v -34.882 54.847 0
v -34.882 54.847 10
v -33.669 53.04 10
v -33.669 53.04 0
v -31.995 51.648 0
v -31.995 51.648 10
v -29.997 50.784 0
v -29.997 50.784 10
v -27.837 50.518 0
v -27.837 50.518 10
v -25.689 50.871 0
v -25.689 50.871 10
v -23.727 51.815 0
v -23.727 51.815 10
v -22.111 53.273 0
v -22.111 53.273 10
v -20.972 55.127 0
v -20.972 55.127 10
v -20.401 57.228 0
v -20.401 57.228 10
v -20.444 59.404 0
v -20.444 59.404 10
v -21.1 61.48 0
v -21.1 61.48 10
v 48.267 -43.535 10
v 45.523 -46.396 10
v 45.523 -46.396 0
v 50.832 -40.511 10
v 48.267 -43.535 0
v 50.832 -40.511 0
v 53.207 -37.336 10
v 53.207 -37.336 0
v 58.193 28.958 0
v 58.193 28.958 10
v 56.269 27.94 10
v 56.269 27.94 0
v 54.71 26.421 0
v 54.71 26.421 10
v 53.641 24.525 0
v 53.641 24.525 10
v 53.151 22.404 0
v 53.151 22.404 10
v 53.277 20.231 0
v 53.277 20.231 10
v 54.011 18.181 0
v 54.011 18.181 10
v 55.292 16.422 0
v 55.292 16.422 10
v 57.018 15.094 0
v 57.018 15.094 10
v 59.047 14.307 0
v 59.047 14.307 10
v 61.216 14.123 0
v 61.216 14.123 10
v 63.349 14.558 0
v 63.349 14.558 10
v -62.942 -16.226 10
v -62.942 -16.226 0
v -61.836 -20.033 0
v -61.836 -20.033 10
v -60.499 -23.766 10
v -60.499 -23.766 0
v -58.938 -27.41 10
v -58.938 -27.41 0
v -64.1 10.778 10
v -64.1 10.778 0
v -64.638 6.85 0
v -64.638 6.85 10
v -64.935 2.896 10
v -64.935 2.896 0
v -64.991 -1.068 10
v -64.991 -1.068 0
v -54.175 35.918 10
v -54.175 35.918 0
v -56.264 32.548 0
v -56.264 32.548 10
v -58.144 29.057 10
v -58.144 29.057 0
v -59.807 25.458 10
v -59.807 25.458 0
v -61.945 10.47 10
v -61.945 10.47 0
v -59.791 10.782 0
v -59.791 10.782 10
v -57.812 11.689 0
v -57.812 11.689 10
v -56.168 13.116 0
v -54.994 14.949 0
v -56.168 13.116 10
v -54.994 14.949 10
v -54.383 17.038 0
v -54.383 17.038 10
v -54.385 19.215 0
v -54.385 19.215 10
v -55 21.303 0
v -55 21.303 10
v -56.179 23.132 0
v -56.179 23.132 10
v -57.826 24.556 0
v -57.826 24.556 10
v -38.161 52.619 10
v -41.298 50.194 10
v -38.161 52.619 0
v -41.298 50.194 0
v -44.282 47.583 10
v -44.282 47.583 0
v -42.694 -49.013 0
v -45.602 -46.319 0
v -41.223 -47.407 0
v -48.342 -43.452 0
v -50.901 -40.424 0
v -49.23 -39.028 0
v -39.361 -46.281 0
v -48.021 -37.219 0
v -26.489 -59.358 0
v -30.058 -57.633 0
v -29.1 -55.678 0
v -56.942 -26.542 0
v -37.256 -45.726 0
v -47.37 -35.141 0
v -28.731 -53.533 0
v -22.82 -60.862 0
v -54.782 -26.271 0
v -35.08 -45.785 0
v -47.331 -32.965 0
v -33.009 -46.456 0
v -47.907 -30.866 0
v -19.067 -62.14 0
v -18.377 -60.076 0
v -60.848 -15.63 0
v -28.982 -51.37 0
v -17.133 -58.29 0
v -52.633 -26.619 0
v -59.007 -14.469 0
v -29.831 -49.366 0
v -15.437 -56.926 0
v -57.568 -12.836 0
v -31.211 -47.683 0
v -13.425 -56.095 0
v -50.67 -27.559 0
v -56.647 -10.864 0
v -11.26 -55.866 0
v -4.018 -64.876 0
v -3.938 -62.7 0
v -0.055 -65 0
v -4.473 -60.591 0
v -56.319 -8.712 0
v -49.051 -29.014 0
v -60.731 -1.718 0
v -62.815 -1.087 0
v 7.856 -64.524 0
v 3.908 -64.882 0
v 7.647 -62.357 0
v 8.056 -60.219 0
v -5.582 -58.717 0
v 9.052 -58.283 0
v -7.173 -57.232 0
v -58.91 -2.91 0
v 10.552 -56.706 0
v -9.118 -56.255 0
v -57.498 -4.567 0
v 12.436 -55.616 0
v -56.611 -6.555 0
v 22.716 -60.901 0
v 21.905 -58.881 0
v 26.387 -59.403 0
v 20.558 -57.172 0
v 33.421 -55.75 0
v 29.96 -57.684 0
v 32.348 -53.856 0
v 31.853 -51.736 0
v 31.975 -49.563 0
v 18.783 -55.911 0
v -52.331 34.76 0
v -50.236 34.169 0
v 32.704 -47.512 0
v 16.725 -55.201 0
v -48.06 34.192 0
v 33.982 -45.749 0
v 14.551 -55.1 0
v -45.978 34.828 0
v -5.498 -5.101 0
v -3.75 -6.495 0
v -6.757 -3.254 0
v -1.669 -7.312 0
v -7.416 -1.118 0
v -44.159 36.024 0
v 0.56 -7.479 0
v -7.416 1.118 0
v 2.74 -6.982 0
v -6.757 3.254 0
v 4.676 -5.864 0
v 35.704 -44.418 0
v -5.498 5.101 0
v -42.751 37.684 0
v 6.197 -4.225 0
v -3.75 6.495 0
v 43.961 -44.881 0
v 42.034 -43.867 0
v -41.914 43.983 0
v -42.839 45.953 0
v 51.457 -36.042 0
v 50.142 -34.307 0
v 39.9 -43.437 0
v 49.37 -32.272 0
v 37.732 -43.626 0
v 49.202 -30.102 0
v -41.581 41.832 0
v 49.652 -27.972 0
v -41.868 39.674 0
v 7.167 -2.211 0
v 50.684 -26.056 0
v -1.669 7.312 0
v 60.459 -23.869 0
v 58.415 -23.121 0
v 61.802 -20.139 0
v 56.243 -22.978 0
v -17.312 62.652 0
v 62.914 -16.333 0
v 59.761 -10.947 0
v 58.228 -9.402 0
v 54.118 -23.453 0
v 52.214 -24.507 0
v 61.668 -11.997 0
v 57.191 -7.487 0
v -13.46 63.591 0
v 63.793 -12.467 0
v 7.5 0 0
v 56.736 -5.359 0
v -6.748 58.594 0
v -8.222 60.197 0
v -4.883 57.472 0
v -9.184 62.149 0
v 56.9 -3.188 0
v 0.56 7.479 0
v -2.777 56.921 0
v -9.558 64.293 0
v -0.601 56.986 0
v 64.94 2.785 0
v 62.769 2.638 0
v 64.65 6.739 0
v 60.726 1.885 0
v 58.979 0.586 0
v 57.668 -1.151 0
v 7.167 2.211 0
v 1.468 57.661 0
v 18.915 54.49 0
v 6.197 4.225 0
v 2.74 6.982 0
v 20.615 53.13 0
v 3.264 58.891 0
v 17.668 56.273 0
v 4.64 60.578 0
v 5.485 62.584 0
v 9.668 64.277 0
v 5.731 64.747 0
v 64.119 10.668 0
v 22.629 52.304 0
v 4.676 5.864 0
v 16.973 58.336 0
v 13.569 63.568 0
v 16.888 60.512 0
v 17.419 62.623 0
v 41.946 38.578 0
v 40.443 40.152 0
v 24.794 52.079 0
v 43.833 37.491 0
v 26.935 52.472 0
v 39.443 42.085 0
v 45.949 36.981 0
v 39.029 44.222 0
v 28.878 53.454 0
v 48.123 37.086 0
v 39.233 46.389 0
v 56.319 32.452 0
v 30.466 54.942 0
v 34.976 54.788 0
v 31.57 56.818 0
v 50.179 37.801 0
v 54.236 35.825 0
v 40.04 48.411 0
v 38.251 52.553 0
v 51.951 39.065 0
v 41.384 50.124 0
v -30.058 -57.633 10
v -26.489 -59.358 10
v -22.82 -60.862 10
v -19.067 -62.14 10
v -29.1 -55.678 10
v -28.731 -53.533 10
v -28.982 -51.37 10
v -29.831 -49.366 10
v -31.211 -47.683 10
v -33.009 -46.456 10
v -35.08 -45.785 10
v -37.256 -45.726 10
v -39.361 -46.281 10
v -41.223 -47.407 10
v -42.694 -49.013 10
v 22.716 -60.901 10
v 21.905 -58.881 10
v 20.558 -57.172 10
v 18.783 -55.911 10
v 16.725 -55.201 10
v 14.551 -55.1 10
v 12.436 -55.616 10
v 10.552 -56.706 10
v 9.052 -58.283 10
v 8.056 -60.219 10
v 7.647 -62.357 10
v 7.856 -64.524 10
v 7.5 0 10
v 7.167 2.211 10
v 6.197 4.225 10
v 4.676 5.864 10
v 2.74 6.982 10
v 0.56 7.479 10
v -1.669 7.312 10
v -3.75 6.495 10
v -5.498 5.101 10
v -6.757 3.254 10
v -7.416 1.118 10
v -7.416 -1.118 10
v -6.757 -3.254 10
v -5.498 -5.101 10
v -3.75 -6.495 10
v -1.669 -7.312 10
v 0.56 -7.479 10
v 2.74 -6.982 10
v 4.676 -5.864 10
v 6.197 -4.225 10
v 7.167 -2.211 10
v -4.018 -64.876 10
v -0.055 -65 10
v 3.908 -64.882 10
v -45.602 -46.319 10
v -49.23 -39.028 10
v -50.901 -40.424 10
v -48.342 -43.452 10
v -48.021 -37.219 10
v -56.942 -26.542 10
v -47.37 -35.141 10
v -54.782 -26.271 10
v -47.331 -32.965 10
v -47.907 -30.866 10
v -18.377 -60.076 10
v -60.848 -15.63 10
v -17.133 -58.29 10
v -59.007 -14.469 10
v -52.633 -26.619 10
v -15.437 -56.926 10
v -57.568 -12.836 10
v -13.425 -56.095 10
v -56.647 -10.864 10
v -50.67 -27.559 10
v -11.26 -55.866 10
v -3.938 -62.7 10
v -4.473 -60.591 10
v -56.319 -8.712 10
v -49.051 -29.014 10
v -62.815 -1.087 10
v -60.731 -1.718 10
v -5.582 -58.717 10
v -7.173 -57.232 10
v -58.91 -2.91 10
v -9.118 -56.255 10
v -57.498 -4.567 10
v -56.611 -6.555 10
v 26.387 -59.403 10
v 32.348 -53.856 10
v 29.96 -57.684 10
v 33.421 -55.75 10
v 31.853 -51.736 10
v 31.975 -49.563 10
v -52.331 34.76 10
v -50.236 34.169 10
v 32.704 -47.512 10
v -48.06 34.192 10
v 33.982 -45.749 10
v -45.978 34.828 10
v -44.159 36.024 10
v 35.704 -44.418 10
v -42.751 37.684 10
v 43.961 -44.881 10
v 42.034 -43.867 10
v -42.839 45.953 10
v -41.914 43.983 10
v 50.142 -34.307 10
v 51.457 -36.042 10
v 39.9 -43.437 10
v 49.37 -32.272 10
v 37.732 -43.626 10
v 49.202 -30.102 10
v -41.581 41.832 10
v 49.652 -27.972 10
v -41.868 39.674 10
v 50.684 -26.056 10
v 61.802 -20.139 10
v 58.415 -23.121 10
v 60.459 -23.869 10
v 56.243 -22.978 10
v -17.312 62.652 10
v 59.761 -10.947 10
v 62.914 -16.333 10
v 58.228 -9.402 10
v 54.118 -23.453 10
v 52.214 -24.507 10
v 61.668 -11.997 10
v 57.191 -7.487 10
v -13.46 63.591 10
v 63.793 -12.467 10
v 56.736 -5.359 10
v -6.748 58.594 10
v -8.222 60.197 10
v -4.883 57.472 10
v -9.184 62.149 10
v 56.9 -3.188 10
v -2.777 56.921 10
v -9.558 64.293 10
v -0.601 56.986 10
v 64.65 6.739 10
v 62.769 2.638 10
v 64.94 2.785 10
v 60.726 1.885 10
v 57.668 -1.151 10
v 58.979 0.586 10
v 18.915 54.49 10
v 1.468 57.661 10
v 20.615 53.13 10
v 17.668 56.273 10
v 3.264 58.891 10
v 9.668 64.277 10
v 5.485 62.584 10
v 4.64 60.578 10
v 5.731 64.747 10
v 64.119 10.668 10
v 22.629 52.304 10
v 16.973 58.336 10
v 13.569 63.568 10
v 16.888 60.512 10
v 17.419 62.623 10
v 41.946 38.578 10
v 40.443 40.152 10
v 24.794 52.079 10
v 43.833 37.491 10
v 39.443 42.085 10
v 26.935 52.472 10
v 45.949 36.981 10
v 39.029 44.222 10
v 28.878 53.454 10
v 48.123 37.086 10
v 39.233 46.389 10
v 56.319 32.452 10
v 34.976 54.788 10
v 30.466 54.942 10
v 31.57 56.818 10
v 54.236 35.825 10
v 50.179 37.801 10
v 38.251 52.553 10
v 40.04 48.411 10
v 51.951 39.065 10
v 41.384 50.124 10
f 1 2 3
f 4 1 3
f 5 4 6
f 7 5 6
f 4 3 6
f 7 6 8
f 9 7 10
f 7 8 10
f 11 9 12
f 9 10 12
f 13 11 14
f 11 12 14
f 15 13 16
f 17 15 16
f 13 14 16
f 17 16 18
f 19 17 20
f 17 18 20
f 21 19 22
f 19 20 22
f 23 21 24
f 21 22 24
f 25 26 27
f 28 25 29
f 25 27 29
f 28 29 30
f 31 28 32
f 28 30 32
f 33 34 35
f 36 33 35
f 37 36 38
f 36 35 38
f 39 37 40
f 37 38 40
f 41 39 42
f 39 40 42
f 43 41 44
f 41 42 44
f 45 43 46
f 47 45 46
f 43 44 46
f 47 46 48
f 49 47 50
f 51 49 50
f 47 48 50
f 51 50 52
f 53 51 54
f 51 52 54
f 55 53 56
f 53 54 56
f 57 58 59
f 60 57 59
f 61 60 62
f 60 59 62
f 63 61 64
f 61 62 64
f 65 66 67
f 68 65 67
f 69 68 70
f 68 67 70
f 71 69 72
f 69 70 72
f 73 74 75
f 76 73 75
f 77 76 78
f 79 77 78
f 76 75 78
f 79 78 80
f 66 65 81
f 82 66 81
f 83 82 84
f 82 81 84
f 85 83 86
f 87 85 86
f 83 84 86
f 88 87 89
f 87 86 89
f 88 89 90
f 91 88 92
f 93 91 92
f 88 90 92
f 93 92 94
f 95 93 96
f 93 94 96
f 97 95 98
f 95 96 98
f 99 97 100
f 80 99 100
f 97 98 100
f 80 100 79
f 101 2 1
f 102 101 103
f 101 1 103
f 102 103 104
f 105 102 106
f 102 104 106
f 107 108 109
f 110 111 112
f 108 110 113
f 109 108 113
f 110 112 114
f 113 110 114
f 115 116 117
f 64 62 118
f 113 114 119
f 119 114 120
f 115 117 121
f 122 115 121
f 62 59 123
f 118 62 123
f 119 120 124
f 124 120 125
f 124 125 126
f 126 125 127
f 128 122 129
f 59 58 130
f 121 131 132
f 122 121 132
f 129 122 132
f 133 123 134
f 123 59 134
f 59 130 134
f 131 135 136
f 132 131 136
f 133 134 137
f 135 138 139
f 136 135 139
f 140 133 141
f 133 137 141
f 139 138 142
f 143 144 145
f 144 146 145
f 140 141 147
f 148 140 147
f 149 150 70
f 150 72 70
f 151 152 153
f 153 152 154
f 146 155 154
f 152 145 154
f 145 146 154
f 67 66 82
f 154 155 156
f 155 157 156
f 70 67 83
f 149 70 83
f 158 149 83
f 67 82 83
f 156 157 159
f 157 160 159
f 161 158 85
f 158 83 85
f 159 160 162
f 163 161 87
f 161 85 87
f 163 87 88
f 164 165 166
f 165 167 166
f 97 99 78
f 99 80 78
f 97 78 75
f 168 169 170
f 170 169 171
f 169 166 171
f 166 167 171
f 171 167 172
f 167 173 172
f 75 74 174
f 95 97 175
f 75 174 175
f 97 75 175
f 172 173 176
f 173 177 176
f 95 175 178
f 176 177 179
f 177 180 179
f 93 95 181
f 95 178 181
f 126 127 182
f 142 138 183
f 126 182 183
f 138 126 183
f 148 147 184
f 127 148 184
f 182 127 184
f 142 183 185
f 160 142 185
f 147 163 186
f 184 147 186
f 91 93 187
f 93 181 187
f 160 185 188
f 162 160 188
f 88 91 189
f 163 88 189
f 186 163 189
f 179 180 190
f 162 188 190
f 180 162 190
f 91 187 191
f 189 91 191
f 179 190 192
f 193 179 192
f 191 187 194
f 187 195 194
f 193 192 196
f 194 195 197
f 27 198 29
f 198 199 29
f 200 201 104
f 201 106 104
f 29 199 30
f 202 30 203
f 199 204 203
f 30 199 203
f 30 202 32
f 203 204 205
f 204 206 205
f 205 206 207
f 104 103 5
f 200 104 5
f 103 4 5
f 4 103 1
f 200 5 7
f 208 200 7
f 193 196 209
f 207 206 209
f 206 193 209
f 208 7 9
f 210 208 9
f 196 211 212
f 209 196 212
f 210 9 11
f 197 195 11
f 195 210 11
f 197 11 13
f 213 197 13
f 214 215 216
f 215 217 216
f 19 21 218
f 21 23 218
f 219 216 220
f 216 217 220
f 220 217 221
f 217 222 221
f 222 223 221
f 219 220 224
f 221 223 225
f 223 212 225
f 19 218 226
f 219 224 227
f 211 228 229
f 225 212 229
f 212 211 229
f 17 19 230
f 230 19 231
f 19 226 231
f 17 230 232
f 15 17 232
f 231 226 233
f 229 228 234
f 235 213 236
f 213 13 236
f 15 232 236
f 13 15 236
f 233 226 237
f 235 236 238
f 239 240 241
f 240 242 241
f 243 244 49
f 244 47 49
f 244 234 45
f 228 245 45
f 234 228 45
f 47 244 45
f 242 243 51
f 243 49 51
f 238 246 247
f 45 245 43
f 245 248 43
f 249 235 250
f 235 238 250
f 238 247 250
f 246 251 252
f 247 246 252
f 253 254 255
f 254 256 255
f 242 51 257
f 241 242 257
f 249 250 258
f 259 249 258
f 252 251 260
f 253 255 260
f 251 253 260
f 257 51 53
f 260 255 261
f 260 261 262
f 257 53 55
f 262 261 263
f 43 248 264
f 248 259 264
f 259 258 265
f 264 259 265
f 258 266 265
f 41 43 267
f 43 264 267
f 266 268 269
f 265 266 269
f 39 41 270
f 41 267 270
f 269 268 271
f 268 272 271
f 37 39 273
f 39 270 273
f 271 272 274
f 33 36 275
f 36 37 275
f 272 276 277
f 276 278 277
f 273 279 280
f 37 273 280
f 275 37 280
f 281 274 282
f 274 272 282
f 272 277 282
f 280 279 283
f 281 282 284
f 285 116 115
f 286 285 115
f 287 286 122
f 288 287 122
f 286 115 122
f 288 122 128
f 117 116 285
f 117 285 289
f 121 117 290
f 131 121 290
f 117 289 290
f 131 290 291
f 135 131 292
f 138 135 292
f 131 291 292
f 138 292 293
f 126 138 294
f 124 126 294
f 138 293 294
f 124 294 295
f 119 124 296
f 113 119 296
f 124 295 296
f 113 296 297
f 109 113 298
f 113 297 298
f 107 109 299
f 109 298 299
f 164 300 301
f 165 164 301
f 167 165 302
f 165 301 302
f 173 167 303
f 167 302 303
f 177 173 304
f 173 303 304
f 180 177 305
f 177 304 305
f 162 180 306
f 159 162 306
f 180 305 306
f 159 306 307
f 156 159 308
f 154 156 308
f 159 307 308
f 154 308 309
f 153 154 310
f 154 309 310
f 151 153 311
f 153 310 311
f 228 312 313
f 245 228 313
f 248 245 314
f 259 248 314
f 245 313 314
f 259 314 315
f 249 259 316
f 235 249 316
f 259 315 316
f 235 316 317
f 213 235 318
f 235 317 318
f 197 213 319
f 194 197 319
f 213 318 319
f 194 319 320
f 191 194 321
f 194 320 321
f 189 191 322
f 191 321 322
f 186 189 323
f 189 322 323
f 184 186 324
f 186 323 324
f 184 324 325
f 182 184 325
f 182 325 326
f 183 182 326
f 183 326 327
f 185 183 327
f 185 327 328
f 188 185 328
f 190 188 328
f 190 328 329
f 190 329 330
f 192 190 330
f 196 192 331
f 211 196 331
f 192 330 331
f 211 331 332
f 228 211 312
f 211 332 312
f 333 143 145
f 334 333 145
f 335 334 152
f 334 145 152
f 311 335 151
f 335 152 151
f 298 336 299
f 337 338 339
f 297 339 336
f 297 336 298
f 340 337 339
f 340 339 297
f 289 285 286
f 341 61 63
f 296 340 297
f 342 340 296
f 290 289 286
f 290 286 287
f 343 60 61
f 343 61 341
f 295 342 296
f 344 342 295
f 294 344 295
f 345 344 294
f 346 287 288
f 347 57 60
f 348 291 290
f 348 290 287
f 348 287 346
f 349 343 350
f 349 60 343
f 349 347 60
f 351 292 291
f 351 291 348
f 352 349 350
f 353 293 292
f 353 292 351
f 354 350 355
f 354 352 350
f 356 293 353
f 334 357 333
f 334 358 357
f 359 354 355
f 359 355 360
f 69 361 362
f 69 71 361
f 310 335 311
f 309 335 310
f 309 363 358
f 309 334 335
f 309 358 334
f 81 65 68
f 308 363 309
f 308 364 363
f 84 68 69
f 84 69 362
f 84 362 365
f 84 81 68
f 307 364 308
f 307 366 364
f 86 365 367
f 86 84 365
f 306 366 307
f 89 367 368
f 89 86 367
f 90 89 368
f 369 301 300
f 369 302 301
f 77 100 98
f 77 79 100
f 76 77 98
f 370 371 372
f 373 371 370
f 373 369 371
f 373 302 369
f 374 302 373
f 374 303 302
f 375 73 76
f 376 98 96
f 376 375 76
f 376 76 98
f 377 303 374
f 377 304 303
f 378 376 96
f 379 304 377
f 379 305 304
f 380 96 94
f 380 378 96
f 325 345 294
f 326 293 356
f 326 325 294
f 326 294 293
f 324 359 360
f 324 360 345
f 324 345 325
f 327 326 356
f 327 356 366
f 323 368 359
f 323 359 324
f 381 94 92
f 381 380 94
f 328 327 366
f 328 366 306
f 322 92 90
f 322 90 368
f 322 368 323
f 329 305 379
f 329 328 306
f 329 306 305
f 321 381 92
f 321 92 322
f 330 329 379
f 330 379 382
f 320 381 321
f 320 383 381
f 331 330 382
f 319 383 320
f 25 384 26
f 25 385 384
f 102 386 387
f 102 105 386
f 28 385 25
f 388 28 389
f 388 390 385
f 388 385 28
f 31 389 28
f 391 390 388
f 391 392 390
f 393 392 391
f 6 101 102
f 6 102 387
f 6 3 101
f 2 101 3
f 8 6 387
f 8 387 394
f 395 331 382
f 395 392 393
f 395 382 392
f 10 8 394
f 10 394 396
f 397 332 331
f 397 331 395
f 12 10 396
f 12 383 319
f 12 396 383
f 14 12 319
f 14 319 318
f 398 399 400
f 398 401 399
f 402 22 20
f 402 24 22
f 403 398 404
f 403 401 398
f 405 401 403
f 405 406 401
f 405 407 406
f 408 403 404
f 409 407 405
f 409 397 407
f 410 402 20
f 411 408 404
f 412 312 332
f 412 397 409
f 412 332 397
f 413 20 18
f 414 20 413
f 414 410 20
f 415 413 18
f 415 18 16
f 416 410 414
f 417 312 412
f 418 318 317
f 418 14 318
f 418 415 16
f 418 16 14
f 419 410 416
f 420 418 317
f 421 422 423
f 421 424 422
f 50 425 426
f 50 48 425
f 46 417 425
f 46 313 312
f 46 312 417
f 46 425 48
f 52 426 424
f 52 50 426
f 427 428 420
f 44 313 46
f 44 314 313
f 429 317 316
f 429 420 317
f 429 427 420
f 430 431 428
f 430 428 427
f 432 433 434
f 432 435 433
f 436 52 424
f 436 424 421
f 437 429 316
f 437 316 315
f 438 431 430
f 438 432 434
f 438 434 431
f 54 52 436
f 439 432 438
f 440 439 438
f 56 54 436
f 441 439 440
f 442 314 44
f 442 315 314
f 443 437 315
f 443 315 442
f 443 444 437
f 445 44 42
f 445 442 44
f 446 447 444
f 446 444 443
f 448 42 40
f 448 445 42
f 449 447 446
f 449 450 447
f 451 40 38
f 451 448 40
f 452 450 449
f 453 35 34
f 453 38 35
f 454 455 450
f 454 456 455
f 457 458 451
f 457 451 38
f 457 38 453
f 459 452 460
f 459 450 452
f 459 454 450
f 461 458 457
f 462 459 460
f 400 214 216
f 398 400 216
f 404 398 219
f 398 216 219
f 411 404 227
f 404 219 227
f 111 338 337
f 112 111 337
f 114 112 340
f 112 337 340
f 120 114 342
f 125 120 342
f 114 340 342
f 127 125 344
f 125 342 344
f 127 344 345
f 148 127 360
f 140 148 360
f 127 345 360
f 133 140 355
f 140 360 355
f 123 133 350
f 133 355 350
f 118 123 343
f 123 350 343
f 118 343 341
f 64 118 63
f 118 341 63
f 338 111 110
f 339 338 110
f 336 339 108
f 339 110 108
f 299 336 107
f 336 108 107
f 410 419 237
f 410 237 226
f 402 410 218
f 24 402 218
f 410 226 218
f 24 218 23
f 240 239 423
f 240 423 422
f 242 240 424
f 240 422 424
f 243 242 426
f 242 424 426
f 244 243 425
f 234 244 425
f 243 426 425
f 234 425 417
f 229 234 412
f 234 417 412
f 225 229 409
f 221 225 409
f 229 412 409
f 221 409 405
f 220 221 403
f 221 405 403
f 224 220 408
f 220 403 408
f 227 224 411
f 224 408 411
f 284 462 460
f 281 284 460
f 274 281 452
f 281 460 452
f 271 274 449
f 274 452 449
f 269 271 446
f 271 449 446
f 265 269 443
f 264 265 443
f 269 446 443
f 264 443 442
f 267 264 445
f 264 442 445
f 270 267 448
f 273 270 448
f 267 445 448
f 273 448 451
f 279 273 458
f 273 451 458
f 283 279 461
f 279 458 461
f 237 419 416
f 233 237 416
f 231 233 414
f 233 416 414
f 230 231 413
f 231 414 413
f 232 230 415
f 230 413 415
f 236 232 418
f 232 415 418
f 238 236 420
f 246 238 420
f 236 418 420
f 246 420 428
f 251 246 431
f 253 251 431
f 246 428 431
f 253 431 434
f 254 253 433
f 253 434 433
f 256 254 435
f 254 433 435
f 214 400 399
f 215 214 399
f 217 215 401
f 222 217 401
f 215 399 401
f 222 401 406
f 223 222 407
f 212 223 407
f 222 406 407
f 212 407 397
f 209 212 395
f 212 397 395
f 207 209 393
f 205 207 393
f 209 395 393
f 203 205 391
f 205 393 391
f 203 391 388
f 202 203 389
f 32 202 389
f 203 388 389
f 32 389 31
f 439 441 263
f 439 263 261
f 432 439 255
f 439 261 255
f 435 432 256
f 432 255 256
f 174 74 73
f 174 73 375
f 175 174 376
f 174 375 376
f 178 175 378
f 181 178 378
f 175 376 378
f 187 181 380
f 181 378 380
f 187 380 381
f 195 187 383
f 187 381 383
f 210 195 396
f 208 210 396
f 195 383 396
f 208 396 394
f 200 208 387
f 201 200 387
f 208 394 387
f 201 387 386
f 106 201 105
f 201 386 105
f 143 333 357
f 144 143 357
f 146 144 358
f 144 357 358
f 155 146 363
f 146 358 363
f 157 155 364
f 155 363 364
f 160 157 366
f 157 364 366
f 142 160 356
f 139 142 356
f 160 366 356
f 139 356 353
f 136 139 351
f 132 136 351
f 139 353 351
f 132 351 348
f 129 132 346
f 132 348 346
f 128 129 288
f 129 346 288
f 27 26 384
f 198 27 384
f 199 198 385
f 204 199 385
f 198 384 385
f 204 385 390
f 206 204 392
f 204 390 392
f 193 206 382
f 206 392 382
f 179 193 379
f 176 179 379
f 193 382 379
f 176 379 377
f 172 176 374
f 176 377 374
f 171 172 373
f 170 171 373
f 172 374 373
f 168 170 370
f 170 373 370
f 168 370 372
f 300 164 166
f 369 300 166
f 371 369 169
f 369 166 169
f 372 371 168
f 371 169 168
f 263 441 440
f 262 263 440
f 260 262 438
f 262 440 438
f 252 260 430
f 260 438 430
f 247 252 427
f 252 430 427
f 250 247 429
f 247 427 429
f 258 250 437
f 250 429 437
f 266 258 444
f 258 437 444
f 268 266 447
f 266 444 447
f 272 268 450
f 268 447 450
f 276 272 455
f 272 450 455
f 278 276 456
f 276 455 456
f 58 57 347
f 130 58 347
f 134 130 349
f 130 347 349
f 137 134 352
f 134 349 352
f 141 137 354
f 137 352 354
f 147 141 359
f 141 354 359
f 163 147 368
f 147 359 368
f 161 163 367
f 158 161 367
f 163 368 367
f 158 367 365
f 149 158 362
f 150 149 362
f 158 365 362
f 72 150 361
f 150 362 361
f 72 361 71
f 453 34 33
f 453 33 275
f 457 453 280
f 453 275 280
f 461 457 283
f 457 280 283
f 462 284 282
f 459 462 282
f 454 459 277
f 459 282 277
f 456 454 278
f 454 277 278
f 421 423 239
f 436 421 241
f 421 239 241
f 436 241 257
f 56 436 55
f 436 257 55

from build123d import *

# Parameters (mm, degrees)
SKETCH1_R               = 65
BOSS_EXTRUDE1_DEPTH     = 10
CUT_EXTRUDE4_DEPTH      = 93.466210045
CUT_EXTRUDE4_DEPTH_BACK = 93.466210045
SKETCH2_OUTSIDE_W       = 168.824
SKETCH2_OUTSIDE_H       = 168.824
SKETCH3_R               = 7.5
CUT_EXTRUDE5_DEPTH      = 10


with BuildPart() as part:
    # Sketch1 → Boss-Extrude1 (new body)
    with BuildSketch(Plane.XY):
        Circle(SKETCH1_R)
    extrude(amount=BOSS_EXTRUDE1_DEPTH)

    # Sketch2 outside → Cut-Extrude4 (cut, two sides: drawn at the far end of the back side and taken through both)
    with BuildSketch(Plane(origin=(0, 0, 0), x_dir=(-1, 0, 0), z_dir=(0, 0, -1)).offset(-CUT_EXTRUDE4_DEPTH_BACK)):
        Rectangle(SKETCH2_OUTSIDE_W, SKETCH2_OUTSIDE_H)
        with BuildLine():
            ThreePointArc((-5.730851082, 64.746871321), (-11.623493415, 63.952282217), (-17.418870891, 62.62254336))
            ThreePointArc((-17.418870891, 62.62254336), (-21.592454328, 52.644679623), (-31.570318066, 56.818263061))
            ThreePointArc((-31.570318066, 56.818263061), (-36.630326198, 53.695616233), (-41.383813447, 50.123646961))
            ThreePointArc((-41.383813447, 50.123646961), (-41.138208837, 39.310865549), (-51.950990248, 39.065260939))
            ThreePointArc((-51.950990248, 39.065260939), (-55.303442804, 34.154490393), (-58.193118697, 28.957916642))
            ThreePointArc((-58.193118697, 28.957916642), (-53.570793308, 19.179845694), (-63.348864256, 14.557520305))
            ThreePointArc((-63.348864256, 14.557520305), (-64.414091734, 8.707742879), (-64.940305058, 2.785099462))
            ThreePointArc((-64.940305058, 2.785099462), (-56.740500941, -4.267543725), (-63.793144129, -12.467347841))
            ThreePointArc((-63.793144129, -12.467347841), (-62.38695902, -18.244652485), (-60.458722709, -23.869286717))
            ThreePointArc((-60.458722709, -23.869286717), (-50.099260491, -26.977036065), (-53.207009838, -37.336498283))
            ThreePointArc((-53.207009838, -37.336498283), (-49.572554323, -42.042381687), (-45.523277954, -46.396456377))
            ThreePointArc((-45.523277954, -46.396456377), (-34.795402763, -45.02195379), (-33.420900177, -55.749828981))
            ThreePointArc((-33.420900177, -55.749828981), (-28.186604631, -58.570601153), (-22.716444875, -60.90125723))
            ThreePointArc((-22.716444875, -60.90125723), (-13.475103792, -55.282166693), (-7.856013255, -64.523507776))
            ThreePointArc((-7.856013255, -64.523507776), (-1.926934931, -64.971431582), (4.018267896, -64.875677439))
            ThreePointArc((4.018267896, -64.875677439), (10.175163042, -55.983590753), (19.067249728, -62.140485899))
            ThreePointArc((19.067249728, -62.140485899), (24.665919324, -60.138111243), (30.058185642, -57.632503641))
            ThreePointArc((30.058185642, -57.632503641), (32.066051748, -47.004943376), (42.693612013, -49.012809482))
            ThreePointArc((42.693612013, -49.012809482), (46.993812045, -44.906365133), (50.900770021, -40.424146388))
            ThreePointArc((50.900770021, -40.424146388), (48.412428796, -29.898714263), (58.937860921, -27.410373038))
            ThreePointArc((58.937860921, -27.410373038), (61.196047738, -21.90990053), (62.942148845, -16.226086984))
            ThreePointArc((62.942148845, -16.226086984), (56.387857092, -7.622725833), (64.991218242, -1.06843408))
            ThreePointArc((64.991218242, -1.06843408), (64.816930829, 4.87498492), (64.100258321, 10.77761027))
            ThreePointArc((64.100258321, 10.77761027), (54.613312629, 15.971301144), (59.807003503, 25.458246837))
            ThreePointArc((59.807003503, 25.458246837), (57.230377735, 30.816941189), (54.174850802, 35.917760796))
            ThreePointArc((54.174850802, 35.917760796), (43.395630266, 36.803745059), (44.281614528, 47.582965594))
            ThreePointArc((44.281614528, 47.582965594), (39.74817241, 51.430368364), (34.882119415, 54.847404178))
            ThreePointArc((34.882119415, 54.847404178), (24.674449193, 51.272487101), (21.099532116, 61.480157323))
            ThreePointArc((21.099532116, 61.480157323), (15.393146975, 63.151017618), (9.557952688, 64.293433105))
            ThreePointArc((9.557952688, 64.293433105), (1.686831695, 56.875750328), (-5.730851082, 64.746871321))
        make_face(mode=Mode.SUBTRACT)
    extrude(amount=CUT_EXTRUDE4_DEPTH + CUT_EXTRUDE4_DEPTH_BACK, mode=Mode.SUBTRACT)

    # Sketch3 → Cut-Extrude5 (cut)
    with BuildSketch(Plane.XY.offset(10)):
        Circle(SKETCH3_R)
    extrude(amount=-CUT_EXTRUDE5_DEPTH, mode=Mode.SUBTRACT)


solid = part.part
